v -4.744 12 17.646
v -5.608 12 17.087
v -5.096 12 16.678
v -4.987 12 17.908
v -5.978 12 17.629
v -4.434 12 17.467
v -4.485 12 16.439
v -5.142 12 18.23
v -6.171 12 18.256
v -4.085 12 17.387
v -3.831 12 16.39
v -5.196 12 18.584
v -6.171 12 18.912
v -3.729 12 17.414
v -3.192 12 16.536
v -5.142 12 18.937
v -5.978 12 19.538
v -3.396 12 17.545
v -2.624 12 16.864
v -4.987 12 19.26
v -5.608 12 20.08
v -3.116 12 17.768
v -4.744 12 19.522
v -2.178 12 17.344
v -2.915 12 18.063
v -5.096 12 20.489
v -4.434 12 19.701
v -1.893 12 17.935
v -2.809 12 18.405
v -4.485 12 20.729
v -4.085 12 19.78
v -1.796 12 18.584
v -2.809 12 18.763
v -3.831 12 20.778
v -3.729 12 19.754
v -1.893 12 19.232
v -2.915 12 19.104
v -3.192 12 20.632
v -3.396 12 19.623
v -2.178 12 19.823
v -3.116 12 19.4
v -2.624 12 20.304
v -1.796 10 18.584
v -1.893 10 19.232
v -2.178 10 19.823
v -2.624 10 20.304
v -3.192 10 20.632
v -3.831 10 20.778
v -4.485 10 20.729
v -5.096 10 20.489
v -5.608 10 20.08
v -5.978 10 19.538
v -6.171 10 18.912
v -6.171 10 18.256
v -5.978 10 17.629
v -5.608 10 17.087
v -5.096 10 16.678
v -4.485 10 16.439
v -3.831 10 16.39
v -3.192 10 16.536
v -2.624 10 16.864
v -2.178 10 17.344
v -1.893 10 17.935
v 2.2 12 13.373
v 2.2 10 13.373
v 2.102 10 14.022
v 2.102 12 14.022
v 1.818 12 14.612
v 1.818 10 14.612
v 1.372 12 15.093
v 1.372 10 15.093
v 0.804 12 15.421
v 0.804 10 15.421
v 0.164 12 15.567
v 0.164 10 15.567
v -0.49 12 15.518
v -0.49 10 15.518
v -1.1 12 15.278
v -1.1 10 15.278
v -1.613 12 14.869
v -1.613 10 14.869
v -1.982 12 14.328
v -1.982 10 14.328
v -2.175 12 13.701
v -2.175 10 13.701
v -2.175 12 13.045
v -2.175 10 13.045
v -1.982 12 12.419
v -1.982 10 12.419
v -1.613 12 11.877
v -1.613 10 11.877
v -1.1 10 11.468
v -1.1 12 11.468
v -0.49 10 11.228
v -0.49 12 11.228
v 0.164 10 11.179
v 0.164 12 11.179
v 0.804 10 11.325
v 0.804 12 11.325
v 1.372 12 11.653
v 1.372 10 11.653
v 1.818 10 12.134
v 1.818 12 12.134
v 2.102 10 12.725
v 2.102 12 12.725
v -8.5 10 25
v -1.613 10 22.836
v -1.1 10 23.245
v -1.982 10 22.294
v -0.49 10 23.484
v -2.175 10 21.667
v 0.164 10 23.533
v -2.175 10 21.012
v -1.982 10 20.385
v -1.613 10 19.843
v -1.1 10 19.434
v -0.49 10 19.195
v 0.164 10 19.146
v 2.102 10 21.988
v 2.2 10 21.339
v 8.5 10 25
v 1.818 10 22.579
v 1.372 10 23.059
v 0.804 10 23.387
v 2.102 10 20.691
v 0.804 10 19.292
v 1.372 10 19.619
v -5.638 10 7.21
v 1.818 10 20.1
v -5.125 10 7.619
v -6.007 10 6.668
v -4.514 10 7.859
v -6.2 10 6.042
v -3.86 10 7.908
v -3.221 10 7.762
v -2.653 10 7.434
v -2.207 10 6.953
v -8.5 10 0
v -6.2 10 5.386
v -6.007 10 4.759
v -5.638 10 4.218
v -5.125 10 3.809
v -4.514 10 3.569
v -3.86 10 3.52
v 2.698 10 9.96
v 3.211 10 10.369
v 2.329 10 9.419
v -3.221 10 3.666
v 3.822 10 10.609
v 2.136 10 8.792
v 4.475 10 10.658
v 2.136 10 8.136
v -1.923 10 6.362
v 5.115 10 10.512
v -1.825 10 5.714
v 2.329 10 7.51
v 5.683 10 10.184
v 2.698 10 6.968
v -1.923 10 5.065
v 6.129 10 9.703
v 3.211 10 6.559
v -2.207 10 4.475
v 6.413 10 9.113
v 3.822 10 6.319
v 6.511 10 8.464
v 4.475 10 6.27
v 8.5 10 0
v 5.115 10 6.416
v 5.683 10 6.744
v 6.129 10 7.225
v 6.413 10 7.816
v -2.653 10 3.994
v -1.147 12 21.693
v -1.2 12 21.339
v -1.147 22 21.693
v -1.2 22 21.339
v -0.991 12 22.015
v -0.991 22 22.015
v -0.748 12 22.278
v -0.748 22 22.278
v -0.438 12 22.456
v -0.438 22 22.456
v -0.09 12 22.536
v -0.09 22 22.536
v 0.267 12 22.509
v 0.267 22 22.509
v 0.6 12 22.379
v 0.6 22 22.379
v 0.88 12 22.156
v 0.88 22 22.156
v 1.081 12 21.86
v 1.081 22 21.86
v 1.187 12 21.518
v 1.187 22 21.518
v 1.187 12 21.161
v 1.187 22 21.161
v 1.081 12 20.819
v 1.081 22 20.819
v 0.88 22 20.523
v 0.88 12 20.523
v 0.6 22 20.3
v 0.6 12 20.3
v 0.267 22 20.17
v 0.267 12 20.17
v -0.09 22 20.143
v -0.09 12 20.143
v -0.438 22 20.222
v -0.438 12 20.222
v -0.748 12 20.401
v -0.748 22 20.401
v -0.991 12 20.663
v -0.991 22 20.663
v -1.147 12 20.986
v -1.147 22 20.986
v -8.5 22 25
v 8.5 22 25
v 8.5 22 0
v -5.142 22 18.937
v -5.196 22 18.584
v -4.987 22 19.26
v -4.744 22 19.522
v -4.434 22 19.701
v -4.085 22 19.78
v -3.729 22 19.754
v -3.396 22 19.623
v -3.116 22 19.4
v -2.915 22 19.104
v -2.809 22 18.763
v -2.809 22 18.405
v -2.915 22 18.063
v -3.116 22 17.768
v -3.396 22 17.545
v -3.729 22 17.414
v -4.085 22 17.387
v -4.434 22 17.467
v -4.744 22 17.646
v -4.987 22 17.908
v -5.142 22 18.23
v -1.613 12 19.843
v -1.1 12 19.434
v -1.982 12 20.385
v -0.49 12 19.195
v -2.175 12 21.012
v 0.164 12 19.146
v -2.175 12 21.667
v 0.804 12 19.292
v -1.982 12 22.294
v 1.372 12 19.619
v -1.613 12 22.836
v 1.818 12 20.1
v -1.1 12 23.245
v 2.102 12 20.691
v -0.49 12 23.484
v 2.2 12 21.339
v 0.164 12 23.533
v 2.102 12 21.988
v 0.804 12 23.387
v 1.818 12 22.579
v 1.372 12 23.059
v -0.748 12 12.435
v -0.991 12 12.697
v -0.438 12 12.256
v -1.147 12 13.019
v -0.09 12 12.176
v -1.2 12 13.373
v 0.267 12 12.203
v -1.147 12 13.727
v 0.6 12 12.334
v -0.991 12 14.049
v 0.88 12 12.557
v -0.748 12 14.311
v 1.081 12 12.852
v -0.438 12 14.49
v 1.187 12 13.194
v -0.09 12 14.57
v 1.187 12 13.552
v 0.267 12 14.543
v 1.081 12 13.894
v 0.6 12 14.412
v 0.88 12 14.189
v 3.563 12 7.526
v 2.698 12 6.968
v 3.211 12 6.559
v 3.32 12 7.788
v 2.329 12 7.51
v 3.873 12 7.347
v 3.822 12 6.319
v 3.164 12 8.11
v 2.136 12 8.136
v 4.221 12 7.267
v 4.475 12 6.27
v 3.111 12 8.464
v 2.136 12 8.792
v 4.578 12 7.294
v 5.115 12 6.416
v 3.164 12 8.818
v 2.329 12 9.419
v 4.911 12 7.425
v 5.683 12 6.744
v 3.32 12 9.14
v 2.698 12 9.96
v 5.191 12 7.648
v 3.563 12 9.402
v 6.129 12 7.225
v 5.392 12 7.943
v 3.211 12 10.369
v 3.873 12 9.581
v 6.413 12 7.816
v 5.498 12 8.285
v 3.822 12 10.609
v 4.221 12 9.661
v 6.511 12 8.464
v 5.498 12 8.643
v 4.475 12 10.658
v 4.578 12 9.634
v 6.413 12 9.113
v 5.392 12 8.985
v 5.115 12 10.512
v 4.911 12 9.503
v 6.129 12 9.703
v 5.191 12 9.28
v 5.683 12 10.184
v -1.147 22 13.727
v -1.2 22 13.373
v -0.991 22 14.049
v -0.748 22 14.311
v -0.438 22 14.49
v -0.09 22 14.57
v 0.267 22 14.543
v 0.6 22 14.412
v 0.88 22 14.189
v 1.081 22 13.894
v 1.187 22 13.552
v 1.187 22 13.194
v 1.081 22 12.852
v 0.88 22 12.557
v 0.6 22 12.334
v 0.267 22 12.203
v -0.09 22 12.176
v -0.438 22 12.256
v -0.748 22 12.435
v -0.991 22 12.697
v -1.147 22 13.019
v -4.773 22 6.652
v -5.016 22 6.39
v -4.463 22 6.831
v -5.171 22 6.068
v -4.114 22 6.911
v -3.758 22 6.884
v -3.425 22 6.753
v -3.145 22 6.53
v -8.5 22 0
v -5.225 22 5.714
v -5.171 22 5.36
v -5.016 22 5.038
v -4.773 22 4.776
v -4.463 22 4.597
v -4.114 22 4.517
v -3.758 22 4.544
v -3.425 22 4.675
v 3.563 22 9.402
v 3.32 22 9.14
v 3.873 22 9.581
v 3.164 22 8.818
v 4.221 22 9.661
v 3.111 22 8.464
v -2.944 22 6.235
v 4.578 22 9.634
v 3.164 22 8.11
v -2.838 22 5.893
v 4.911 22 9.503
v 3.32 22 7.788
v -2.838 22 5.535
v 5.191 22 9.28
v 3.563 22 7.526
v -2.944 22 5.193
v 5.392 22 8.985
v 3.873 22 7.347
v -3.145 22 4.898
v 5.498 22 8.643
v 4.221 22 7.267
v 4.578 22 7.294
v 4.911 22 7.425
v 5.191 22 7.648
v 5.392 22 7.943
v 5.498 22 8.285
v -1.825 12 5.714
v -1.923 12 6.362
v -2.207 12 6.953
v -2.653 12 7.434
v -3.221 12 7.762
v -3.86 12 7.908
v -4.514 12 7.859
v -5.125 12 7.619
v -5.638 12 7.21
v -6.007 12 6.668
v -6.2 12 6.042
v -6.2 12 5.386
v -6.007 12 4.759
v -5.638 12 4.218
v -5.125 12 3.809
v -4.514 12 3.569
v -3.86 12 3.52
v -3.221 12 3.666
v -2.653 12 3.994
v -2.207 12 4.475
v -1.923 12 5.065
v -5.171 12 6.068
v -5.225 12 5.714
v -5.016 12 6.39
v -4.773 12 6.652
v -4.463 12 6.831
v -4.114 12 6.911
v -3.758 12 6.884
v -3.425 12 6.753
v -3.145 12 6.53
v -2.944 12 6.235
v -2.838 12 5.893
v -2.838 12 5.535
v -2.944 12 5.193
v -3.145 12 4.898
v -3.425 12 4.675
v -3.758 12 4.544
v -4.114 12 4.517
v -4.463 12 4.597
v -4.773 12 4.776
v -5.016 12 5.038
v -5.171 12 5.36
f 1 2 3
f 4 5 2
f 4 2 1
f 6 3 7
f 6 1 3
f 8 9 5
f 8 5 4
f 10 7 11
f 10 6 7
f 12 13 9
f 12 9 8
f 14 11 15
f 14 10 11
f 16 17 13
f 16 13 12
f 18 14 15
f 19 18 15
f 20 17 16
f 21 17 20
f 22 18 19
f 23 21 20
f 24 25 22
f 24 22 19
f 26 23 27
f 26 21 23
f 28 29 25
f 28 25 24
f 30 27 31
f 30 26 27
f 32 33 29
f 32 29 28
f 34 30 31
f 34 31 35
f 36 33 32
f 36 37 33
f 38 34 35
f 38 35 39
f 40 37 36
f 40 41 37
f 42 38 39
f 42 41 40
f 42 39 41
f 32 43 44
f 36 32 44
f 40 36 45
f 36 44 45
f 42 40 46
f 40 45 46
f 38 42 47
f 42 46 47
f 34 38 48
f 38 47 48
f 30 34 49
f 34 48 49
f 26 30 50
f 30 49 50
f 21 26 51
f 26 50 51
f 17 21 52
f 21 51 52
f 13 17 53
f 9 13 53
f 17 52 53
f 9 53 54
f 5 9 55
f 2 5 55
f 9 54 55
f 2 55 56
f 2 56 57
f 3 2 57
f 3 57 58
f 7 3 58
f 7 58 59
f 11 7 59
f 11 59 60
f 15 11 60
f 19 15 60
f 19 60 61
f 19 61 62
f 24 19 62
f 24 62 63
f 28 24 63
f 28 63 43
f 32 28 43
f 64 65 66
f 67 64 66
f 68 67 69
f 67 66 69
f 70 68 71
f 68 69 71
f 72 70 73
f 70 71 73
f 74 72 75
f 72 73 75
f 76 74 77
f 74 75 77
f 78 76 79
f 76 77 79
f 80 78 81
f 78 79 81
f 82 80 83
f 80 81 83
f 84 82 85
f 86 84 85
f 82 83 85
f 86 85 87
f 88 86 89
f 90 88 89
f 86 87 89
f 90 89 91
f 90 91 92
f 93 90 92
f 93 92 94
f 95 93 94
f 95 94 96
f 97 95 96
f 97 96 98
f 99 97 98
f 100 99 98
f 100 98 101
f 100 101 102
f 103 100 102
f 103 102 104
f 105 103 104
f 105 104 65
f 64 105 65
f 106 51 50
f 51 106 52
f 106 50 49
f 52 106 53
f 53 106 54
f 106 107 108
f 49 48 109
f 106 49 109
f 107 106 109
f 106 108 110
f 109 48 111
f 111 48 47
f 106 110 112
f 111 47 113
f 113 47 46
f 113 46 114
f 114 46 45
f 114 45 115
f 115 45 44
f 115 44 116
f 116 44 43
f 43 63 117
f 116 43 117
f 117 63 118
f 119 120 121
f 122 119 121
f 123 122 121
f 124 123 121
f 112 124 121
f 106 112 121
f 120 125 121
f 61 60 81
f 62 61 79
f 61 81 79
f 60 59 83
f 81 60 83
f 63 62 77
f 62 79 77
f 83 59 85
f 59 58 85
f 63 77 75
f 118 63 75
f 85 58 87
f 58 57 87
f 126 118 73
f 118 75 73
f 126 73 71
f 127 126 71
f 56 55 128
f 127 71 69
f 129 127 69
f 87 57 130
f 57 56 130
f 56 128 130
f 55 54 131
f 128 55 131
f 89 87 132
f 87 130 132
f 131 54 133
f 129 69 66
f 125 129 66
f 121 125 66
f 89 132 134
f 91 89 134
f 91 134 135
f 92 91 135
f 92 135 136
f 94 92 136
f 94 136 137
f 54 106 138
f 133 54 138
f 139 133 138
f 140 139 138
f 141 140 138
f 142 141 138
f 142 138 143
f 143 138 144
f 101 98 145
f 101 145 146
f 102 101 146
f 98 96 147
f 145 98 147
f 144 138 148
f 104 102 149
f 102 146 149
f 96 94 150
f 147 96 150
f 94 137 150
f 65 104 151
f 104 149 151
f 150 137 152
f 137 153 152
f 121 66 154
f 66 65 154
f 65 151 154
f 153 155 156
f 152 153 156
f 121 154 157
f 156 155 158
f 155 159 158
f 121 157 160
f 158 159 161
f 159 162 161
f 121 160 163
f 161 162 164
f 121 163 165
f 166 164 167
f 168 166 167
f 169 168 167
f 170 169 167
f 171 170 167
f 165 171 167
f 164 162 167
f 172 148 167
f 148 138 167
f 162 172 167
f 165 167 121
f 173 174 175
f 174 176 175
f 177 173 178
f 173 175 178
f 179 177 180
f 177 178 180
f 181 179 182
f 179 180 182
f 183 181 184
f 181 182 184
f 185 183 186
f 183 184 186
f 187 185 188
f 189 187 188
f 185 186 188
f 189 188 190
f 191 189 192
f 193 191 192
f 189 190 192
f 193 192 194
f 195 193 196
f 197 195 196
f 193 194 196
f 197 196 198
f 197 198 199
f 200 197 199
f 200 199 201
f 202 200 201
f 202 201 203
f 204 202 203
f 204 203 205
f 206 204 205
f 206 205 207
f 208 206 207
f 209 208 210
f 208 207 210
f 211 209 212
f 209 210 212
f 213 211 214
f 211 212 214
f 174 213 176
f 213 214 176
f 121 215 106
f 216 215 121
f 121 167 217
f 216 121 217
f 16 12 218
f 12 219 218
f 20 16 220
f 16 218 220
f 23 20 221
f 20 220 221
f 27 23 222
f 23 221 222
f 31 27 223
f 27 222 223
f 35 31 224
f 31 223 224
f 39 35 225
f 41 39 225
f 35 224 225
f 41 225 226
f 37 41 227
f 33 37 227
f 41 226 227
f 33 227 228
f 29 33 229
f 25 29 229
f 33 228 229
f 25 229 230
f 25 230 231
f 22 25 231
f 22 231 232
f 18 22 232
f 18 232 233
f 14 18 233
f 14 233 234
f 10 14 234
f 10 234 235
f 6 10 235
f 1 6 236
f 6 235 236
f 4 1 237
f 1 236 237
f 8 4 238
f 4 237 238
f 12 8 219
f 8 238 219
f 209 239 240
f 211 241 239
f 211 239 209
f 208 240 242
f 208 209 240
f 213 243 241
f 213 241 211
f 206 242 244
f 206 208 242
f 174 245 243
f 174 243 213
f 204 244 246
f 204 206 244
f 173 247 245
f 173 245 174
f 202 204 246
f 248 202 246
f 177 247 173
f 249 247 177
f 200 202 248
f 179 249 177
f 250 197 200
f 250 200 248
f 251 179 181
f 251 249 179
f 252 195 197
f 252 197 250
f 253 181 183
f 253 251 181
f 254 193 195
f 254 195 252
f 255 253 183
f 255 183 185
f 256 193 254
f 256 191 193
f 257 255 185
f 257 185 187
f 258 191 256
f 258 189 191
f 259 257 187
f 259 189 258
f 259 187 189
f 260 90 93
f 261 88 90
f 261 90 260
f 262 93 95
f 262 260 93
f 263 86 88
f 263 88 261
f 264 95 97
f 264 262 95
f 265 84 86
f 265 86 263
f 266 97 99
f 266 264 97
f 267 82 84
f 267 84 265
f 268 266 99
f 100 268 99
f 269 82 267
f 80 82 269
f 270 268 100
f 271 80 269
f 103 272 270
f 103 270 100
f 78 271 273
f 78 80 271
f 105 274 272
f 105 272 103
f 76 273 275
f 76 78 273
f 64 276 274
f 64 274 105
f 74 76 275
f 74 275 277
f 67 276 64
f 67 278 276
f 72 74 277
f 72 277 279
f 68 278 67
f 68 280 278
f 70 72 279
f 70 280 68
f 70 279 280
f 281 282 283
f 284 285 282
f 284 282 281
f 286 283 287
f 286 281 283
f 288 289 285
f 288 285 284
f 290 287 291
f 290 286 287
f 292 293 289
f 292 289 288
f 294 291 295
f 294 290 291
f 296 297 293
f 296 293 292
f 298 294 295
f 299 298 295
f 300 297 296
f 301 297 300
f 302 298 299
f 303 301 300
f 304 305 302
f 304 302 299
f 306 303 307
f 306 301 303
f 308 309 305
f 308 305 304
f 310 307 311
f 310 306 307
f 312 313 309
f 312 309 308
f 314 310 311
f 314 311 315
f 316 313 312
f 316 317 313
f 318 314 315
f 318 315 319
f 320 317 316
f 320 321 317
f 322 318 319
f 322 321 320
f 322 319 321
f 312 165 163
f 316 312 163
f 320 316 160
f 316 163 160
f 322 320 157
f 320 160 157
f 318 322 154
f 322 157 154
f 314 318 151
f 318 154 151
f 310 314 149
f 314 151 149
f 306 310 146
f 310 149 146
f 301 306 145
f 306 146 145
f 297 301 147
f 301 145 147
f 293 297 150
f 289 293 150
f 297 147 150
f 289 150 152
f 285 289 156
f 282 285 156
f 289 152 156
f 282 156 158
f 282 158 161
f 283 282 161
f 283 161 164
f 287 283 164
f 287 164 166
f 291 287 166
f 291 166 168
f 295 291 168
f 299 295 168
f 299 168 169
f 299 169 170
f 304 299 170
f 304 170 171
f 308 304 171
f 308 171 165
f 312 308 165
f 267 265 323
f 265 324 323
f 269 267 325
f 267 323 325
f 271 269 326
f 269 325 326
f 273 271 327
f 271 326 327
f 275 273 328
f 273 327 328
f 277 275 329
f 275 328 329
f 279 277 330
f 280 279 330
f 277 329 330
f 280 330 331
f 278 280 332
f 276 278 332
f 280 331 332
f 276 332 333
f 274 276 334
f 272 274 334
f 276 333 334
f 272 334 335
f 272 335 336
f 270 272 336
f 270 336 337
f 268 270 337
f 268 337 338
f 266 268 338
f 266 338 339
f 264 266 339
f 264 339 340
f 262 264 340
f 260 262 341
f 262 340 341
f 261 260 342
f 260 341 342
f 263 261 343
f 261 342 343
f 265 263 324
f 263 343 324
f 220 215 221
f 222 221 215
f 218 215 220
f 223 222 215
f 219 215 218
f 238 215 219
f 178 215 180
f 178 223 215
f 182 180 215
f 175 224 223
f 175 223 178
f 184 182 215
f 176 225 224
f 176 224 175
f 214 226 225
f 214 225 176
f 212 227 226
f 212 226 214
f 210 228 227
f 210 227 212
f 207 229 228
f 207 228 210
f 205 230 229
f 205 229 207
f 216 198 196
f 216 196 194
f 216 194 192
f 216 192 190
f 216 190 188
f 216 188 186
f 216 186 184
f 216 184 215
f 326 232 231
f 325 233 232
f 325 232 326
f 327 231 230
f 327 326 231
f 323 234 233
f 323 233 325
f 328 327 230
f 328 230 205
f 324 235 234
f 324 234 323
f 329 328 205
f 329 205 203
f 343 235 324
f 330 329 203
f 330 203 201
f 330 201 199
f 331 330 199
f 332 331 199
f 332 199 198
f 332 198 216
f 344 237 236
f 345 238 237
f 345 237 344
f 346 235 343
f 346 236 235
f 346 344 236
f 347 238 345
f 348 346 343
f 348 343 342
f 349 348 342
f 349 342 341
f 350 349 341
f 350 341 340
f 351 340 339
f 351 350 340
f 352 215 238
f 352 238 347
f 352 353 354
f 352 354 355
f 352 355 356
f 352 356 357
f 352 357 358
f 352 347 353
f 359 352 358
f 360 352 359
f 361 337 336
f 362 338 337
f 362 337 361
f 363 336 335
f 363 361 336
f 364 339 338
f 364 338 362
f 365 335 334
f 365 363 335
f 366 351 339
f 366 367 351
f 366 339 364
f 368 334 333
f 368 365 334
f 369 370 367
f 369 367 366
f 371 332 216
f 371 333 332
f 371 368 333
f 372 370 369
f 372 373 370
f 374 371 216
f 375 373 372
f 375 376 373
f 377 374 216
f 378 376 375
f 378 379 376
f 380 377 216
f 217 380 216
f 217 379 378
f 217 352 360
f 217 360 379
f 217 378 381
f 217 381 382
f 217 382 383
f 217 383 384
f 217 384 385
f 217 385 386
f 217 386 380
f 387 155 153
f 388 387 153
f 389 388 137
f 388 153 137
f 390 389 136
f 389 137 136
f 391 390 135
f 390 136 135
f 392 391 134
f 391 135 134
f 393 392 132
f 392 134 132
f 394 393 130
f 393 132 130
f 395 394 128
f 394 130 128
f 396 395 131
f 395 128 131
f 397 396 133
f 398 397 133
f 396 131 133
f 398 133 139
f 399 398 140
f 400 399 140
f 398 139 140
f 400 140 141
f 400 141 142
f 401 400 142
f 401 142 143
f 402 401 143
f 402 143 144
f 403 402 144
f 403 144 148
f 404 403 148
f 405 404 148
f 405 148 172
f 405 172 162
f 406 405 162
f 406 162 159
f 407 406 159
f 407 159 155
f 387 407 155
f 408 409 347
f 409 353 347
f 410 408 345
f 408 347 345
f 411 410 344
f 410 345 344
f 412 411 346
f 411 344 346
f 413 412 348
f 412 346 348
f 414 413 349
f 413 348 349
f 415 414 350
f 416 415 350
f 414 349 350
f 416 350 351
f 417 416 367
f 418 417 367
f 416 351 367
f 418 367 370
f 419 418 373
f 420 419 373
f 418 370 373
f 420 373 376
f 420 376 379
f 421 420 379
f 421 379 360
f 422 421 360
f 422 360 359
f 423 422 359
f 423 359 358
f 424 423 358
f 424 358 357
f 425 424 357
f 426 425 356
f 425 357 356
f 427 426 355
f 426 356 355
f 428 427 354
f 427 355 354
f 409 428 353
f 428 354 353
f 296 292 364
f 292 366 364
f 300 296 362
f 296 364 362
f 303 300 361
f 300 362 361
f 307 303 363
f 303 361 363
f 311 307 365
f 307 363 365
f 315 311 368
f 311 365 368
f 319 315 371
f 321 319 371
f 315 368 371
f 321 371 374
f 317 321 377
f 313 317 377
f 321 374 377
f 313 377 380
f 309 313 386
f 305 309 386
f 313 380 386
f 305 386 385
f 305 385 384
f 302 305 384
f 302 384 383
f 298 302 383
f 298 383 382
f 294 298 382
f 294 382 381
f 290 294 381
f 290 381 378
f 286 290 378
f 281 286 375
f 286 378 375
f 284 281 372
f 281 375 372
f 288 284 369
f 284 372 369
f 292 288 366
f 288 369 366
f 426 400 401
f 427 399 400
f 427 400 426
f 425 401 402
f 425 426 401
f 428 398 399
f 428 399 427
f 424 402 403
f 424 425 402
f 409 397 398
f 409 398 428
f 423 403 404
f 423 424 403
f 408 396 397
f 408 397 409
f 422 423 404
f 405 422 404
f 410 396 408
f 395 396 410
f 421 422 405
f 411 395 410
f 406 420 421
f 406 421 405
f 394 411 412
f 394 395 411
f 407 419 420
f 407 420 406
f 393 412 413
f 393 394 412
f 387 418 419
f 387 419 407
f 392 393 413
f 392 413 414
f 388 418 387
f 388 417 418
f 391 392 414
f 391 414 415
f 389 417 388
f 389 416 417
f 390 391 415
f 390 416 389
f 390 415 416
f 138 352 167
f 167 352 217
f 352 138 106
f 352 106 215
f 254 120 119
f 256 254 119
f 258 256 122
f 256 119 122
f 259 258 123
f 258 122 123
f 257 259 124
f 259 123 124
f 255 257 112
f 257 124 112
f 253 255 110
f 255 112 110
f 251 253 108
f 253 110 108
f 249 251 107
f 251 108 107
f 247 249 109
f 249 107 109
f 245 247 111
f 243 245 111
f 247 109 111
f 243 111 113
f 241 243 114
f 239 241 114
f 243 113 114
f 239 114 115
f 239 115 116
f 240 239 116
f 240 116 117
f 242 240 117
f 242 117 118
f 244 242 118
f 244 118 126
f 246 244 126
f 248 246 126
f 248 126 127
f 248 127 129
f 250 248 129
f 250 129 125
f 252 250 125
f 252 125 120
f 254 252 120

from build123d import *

# Parameters (mm, degrees)
F2_W           = 17
F2_H           = 12
F3_DEPTH       = 25
F5_D           = 2.4
F5_DEPTH       = 12
F5_CBORE_D     = 4.4
F5_CBORE_DEPTH = 2
F5_TIP         = 0.7210327428


# Not quite as in the source:
# - the program builds the solid bodies; features that only make, move or delete a surface that nothing else refers to are left out


with BuildPart() as f3:
    # F2 (on Top) → F3 (new body)
    with BuildSketch(Plane.XY):
        with Locations((0, 16)):
            Rectangle(F2_W, F2_H)
    extrude(amount=F3_DEPTH)

    # F5
    with Locations(Plane.XZ.offset(-10)):
        with Locations((-3.9957389235, 18.5837522149), (0, 21.3394463062), (0, 13.3731160313), (4.3110894039, 8.4640979767), (-4.0247985162, 5.713914521)):
            CounterBoreHole(F5_D / 2, F5_CBORE_D / 2, F5_CBORE_DEPTH, depth=F5_DEPTH)
            with Locations((0, 0, -(F5_DEPTH + F5_TIP / 2))):  # 118° drill point
                Cone(0, F5_D / 2, F5_TIP, mode=Mode.SUBTRACT)


solid = f3.part
